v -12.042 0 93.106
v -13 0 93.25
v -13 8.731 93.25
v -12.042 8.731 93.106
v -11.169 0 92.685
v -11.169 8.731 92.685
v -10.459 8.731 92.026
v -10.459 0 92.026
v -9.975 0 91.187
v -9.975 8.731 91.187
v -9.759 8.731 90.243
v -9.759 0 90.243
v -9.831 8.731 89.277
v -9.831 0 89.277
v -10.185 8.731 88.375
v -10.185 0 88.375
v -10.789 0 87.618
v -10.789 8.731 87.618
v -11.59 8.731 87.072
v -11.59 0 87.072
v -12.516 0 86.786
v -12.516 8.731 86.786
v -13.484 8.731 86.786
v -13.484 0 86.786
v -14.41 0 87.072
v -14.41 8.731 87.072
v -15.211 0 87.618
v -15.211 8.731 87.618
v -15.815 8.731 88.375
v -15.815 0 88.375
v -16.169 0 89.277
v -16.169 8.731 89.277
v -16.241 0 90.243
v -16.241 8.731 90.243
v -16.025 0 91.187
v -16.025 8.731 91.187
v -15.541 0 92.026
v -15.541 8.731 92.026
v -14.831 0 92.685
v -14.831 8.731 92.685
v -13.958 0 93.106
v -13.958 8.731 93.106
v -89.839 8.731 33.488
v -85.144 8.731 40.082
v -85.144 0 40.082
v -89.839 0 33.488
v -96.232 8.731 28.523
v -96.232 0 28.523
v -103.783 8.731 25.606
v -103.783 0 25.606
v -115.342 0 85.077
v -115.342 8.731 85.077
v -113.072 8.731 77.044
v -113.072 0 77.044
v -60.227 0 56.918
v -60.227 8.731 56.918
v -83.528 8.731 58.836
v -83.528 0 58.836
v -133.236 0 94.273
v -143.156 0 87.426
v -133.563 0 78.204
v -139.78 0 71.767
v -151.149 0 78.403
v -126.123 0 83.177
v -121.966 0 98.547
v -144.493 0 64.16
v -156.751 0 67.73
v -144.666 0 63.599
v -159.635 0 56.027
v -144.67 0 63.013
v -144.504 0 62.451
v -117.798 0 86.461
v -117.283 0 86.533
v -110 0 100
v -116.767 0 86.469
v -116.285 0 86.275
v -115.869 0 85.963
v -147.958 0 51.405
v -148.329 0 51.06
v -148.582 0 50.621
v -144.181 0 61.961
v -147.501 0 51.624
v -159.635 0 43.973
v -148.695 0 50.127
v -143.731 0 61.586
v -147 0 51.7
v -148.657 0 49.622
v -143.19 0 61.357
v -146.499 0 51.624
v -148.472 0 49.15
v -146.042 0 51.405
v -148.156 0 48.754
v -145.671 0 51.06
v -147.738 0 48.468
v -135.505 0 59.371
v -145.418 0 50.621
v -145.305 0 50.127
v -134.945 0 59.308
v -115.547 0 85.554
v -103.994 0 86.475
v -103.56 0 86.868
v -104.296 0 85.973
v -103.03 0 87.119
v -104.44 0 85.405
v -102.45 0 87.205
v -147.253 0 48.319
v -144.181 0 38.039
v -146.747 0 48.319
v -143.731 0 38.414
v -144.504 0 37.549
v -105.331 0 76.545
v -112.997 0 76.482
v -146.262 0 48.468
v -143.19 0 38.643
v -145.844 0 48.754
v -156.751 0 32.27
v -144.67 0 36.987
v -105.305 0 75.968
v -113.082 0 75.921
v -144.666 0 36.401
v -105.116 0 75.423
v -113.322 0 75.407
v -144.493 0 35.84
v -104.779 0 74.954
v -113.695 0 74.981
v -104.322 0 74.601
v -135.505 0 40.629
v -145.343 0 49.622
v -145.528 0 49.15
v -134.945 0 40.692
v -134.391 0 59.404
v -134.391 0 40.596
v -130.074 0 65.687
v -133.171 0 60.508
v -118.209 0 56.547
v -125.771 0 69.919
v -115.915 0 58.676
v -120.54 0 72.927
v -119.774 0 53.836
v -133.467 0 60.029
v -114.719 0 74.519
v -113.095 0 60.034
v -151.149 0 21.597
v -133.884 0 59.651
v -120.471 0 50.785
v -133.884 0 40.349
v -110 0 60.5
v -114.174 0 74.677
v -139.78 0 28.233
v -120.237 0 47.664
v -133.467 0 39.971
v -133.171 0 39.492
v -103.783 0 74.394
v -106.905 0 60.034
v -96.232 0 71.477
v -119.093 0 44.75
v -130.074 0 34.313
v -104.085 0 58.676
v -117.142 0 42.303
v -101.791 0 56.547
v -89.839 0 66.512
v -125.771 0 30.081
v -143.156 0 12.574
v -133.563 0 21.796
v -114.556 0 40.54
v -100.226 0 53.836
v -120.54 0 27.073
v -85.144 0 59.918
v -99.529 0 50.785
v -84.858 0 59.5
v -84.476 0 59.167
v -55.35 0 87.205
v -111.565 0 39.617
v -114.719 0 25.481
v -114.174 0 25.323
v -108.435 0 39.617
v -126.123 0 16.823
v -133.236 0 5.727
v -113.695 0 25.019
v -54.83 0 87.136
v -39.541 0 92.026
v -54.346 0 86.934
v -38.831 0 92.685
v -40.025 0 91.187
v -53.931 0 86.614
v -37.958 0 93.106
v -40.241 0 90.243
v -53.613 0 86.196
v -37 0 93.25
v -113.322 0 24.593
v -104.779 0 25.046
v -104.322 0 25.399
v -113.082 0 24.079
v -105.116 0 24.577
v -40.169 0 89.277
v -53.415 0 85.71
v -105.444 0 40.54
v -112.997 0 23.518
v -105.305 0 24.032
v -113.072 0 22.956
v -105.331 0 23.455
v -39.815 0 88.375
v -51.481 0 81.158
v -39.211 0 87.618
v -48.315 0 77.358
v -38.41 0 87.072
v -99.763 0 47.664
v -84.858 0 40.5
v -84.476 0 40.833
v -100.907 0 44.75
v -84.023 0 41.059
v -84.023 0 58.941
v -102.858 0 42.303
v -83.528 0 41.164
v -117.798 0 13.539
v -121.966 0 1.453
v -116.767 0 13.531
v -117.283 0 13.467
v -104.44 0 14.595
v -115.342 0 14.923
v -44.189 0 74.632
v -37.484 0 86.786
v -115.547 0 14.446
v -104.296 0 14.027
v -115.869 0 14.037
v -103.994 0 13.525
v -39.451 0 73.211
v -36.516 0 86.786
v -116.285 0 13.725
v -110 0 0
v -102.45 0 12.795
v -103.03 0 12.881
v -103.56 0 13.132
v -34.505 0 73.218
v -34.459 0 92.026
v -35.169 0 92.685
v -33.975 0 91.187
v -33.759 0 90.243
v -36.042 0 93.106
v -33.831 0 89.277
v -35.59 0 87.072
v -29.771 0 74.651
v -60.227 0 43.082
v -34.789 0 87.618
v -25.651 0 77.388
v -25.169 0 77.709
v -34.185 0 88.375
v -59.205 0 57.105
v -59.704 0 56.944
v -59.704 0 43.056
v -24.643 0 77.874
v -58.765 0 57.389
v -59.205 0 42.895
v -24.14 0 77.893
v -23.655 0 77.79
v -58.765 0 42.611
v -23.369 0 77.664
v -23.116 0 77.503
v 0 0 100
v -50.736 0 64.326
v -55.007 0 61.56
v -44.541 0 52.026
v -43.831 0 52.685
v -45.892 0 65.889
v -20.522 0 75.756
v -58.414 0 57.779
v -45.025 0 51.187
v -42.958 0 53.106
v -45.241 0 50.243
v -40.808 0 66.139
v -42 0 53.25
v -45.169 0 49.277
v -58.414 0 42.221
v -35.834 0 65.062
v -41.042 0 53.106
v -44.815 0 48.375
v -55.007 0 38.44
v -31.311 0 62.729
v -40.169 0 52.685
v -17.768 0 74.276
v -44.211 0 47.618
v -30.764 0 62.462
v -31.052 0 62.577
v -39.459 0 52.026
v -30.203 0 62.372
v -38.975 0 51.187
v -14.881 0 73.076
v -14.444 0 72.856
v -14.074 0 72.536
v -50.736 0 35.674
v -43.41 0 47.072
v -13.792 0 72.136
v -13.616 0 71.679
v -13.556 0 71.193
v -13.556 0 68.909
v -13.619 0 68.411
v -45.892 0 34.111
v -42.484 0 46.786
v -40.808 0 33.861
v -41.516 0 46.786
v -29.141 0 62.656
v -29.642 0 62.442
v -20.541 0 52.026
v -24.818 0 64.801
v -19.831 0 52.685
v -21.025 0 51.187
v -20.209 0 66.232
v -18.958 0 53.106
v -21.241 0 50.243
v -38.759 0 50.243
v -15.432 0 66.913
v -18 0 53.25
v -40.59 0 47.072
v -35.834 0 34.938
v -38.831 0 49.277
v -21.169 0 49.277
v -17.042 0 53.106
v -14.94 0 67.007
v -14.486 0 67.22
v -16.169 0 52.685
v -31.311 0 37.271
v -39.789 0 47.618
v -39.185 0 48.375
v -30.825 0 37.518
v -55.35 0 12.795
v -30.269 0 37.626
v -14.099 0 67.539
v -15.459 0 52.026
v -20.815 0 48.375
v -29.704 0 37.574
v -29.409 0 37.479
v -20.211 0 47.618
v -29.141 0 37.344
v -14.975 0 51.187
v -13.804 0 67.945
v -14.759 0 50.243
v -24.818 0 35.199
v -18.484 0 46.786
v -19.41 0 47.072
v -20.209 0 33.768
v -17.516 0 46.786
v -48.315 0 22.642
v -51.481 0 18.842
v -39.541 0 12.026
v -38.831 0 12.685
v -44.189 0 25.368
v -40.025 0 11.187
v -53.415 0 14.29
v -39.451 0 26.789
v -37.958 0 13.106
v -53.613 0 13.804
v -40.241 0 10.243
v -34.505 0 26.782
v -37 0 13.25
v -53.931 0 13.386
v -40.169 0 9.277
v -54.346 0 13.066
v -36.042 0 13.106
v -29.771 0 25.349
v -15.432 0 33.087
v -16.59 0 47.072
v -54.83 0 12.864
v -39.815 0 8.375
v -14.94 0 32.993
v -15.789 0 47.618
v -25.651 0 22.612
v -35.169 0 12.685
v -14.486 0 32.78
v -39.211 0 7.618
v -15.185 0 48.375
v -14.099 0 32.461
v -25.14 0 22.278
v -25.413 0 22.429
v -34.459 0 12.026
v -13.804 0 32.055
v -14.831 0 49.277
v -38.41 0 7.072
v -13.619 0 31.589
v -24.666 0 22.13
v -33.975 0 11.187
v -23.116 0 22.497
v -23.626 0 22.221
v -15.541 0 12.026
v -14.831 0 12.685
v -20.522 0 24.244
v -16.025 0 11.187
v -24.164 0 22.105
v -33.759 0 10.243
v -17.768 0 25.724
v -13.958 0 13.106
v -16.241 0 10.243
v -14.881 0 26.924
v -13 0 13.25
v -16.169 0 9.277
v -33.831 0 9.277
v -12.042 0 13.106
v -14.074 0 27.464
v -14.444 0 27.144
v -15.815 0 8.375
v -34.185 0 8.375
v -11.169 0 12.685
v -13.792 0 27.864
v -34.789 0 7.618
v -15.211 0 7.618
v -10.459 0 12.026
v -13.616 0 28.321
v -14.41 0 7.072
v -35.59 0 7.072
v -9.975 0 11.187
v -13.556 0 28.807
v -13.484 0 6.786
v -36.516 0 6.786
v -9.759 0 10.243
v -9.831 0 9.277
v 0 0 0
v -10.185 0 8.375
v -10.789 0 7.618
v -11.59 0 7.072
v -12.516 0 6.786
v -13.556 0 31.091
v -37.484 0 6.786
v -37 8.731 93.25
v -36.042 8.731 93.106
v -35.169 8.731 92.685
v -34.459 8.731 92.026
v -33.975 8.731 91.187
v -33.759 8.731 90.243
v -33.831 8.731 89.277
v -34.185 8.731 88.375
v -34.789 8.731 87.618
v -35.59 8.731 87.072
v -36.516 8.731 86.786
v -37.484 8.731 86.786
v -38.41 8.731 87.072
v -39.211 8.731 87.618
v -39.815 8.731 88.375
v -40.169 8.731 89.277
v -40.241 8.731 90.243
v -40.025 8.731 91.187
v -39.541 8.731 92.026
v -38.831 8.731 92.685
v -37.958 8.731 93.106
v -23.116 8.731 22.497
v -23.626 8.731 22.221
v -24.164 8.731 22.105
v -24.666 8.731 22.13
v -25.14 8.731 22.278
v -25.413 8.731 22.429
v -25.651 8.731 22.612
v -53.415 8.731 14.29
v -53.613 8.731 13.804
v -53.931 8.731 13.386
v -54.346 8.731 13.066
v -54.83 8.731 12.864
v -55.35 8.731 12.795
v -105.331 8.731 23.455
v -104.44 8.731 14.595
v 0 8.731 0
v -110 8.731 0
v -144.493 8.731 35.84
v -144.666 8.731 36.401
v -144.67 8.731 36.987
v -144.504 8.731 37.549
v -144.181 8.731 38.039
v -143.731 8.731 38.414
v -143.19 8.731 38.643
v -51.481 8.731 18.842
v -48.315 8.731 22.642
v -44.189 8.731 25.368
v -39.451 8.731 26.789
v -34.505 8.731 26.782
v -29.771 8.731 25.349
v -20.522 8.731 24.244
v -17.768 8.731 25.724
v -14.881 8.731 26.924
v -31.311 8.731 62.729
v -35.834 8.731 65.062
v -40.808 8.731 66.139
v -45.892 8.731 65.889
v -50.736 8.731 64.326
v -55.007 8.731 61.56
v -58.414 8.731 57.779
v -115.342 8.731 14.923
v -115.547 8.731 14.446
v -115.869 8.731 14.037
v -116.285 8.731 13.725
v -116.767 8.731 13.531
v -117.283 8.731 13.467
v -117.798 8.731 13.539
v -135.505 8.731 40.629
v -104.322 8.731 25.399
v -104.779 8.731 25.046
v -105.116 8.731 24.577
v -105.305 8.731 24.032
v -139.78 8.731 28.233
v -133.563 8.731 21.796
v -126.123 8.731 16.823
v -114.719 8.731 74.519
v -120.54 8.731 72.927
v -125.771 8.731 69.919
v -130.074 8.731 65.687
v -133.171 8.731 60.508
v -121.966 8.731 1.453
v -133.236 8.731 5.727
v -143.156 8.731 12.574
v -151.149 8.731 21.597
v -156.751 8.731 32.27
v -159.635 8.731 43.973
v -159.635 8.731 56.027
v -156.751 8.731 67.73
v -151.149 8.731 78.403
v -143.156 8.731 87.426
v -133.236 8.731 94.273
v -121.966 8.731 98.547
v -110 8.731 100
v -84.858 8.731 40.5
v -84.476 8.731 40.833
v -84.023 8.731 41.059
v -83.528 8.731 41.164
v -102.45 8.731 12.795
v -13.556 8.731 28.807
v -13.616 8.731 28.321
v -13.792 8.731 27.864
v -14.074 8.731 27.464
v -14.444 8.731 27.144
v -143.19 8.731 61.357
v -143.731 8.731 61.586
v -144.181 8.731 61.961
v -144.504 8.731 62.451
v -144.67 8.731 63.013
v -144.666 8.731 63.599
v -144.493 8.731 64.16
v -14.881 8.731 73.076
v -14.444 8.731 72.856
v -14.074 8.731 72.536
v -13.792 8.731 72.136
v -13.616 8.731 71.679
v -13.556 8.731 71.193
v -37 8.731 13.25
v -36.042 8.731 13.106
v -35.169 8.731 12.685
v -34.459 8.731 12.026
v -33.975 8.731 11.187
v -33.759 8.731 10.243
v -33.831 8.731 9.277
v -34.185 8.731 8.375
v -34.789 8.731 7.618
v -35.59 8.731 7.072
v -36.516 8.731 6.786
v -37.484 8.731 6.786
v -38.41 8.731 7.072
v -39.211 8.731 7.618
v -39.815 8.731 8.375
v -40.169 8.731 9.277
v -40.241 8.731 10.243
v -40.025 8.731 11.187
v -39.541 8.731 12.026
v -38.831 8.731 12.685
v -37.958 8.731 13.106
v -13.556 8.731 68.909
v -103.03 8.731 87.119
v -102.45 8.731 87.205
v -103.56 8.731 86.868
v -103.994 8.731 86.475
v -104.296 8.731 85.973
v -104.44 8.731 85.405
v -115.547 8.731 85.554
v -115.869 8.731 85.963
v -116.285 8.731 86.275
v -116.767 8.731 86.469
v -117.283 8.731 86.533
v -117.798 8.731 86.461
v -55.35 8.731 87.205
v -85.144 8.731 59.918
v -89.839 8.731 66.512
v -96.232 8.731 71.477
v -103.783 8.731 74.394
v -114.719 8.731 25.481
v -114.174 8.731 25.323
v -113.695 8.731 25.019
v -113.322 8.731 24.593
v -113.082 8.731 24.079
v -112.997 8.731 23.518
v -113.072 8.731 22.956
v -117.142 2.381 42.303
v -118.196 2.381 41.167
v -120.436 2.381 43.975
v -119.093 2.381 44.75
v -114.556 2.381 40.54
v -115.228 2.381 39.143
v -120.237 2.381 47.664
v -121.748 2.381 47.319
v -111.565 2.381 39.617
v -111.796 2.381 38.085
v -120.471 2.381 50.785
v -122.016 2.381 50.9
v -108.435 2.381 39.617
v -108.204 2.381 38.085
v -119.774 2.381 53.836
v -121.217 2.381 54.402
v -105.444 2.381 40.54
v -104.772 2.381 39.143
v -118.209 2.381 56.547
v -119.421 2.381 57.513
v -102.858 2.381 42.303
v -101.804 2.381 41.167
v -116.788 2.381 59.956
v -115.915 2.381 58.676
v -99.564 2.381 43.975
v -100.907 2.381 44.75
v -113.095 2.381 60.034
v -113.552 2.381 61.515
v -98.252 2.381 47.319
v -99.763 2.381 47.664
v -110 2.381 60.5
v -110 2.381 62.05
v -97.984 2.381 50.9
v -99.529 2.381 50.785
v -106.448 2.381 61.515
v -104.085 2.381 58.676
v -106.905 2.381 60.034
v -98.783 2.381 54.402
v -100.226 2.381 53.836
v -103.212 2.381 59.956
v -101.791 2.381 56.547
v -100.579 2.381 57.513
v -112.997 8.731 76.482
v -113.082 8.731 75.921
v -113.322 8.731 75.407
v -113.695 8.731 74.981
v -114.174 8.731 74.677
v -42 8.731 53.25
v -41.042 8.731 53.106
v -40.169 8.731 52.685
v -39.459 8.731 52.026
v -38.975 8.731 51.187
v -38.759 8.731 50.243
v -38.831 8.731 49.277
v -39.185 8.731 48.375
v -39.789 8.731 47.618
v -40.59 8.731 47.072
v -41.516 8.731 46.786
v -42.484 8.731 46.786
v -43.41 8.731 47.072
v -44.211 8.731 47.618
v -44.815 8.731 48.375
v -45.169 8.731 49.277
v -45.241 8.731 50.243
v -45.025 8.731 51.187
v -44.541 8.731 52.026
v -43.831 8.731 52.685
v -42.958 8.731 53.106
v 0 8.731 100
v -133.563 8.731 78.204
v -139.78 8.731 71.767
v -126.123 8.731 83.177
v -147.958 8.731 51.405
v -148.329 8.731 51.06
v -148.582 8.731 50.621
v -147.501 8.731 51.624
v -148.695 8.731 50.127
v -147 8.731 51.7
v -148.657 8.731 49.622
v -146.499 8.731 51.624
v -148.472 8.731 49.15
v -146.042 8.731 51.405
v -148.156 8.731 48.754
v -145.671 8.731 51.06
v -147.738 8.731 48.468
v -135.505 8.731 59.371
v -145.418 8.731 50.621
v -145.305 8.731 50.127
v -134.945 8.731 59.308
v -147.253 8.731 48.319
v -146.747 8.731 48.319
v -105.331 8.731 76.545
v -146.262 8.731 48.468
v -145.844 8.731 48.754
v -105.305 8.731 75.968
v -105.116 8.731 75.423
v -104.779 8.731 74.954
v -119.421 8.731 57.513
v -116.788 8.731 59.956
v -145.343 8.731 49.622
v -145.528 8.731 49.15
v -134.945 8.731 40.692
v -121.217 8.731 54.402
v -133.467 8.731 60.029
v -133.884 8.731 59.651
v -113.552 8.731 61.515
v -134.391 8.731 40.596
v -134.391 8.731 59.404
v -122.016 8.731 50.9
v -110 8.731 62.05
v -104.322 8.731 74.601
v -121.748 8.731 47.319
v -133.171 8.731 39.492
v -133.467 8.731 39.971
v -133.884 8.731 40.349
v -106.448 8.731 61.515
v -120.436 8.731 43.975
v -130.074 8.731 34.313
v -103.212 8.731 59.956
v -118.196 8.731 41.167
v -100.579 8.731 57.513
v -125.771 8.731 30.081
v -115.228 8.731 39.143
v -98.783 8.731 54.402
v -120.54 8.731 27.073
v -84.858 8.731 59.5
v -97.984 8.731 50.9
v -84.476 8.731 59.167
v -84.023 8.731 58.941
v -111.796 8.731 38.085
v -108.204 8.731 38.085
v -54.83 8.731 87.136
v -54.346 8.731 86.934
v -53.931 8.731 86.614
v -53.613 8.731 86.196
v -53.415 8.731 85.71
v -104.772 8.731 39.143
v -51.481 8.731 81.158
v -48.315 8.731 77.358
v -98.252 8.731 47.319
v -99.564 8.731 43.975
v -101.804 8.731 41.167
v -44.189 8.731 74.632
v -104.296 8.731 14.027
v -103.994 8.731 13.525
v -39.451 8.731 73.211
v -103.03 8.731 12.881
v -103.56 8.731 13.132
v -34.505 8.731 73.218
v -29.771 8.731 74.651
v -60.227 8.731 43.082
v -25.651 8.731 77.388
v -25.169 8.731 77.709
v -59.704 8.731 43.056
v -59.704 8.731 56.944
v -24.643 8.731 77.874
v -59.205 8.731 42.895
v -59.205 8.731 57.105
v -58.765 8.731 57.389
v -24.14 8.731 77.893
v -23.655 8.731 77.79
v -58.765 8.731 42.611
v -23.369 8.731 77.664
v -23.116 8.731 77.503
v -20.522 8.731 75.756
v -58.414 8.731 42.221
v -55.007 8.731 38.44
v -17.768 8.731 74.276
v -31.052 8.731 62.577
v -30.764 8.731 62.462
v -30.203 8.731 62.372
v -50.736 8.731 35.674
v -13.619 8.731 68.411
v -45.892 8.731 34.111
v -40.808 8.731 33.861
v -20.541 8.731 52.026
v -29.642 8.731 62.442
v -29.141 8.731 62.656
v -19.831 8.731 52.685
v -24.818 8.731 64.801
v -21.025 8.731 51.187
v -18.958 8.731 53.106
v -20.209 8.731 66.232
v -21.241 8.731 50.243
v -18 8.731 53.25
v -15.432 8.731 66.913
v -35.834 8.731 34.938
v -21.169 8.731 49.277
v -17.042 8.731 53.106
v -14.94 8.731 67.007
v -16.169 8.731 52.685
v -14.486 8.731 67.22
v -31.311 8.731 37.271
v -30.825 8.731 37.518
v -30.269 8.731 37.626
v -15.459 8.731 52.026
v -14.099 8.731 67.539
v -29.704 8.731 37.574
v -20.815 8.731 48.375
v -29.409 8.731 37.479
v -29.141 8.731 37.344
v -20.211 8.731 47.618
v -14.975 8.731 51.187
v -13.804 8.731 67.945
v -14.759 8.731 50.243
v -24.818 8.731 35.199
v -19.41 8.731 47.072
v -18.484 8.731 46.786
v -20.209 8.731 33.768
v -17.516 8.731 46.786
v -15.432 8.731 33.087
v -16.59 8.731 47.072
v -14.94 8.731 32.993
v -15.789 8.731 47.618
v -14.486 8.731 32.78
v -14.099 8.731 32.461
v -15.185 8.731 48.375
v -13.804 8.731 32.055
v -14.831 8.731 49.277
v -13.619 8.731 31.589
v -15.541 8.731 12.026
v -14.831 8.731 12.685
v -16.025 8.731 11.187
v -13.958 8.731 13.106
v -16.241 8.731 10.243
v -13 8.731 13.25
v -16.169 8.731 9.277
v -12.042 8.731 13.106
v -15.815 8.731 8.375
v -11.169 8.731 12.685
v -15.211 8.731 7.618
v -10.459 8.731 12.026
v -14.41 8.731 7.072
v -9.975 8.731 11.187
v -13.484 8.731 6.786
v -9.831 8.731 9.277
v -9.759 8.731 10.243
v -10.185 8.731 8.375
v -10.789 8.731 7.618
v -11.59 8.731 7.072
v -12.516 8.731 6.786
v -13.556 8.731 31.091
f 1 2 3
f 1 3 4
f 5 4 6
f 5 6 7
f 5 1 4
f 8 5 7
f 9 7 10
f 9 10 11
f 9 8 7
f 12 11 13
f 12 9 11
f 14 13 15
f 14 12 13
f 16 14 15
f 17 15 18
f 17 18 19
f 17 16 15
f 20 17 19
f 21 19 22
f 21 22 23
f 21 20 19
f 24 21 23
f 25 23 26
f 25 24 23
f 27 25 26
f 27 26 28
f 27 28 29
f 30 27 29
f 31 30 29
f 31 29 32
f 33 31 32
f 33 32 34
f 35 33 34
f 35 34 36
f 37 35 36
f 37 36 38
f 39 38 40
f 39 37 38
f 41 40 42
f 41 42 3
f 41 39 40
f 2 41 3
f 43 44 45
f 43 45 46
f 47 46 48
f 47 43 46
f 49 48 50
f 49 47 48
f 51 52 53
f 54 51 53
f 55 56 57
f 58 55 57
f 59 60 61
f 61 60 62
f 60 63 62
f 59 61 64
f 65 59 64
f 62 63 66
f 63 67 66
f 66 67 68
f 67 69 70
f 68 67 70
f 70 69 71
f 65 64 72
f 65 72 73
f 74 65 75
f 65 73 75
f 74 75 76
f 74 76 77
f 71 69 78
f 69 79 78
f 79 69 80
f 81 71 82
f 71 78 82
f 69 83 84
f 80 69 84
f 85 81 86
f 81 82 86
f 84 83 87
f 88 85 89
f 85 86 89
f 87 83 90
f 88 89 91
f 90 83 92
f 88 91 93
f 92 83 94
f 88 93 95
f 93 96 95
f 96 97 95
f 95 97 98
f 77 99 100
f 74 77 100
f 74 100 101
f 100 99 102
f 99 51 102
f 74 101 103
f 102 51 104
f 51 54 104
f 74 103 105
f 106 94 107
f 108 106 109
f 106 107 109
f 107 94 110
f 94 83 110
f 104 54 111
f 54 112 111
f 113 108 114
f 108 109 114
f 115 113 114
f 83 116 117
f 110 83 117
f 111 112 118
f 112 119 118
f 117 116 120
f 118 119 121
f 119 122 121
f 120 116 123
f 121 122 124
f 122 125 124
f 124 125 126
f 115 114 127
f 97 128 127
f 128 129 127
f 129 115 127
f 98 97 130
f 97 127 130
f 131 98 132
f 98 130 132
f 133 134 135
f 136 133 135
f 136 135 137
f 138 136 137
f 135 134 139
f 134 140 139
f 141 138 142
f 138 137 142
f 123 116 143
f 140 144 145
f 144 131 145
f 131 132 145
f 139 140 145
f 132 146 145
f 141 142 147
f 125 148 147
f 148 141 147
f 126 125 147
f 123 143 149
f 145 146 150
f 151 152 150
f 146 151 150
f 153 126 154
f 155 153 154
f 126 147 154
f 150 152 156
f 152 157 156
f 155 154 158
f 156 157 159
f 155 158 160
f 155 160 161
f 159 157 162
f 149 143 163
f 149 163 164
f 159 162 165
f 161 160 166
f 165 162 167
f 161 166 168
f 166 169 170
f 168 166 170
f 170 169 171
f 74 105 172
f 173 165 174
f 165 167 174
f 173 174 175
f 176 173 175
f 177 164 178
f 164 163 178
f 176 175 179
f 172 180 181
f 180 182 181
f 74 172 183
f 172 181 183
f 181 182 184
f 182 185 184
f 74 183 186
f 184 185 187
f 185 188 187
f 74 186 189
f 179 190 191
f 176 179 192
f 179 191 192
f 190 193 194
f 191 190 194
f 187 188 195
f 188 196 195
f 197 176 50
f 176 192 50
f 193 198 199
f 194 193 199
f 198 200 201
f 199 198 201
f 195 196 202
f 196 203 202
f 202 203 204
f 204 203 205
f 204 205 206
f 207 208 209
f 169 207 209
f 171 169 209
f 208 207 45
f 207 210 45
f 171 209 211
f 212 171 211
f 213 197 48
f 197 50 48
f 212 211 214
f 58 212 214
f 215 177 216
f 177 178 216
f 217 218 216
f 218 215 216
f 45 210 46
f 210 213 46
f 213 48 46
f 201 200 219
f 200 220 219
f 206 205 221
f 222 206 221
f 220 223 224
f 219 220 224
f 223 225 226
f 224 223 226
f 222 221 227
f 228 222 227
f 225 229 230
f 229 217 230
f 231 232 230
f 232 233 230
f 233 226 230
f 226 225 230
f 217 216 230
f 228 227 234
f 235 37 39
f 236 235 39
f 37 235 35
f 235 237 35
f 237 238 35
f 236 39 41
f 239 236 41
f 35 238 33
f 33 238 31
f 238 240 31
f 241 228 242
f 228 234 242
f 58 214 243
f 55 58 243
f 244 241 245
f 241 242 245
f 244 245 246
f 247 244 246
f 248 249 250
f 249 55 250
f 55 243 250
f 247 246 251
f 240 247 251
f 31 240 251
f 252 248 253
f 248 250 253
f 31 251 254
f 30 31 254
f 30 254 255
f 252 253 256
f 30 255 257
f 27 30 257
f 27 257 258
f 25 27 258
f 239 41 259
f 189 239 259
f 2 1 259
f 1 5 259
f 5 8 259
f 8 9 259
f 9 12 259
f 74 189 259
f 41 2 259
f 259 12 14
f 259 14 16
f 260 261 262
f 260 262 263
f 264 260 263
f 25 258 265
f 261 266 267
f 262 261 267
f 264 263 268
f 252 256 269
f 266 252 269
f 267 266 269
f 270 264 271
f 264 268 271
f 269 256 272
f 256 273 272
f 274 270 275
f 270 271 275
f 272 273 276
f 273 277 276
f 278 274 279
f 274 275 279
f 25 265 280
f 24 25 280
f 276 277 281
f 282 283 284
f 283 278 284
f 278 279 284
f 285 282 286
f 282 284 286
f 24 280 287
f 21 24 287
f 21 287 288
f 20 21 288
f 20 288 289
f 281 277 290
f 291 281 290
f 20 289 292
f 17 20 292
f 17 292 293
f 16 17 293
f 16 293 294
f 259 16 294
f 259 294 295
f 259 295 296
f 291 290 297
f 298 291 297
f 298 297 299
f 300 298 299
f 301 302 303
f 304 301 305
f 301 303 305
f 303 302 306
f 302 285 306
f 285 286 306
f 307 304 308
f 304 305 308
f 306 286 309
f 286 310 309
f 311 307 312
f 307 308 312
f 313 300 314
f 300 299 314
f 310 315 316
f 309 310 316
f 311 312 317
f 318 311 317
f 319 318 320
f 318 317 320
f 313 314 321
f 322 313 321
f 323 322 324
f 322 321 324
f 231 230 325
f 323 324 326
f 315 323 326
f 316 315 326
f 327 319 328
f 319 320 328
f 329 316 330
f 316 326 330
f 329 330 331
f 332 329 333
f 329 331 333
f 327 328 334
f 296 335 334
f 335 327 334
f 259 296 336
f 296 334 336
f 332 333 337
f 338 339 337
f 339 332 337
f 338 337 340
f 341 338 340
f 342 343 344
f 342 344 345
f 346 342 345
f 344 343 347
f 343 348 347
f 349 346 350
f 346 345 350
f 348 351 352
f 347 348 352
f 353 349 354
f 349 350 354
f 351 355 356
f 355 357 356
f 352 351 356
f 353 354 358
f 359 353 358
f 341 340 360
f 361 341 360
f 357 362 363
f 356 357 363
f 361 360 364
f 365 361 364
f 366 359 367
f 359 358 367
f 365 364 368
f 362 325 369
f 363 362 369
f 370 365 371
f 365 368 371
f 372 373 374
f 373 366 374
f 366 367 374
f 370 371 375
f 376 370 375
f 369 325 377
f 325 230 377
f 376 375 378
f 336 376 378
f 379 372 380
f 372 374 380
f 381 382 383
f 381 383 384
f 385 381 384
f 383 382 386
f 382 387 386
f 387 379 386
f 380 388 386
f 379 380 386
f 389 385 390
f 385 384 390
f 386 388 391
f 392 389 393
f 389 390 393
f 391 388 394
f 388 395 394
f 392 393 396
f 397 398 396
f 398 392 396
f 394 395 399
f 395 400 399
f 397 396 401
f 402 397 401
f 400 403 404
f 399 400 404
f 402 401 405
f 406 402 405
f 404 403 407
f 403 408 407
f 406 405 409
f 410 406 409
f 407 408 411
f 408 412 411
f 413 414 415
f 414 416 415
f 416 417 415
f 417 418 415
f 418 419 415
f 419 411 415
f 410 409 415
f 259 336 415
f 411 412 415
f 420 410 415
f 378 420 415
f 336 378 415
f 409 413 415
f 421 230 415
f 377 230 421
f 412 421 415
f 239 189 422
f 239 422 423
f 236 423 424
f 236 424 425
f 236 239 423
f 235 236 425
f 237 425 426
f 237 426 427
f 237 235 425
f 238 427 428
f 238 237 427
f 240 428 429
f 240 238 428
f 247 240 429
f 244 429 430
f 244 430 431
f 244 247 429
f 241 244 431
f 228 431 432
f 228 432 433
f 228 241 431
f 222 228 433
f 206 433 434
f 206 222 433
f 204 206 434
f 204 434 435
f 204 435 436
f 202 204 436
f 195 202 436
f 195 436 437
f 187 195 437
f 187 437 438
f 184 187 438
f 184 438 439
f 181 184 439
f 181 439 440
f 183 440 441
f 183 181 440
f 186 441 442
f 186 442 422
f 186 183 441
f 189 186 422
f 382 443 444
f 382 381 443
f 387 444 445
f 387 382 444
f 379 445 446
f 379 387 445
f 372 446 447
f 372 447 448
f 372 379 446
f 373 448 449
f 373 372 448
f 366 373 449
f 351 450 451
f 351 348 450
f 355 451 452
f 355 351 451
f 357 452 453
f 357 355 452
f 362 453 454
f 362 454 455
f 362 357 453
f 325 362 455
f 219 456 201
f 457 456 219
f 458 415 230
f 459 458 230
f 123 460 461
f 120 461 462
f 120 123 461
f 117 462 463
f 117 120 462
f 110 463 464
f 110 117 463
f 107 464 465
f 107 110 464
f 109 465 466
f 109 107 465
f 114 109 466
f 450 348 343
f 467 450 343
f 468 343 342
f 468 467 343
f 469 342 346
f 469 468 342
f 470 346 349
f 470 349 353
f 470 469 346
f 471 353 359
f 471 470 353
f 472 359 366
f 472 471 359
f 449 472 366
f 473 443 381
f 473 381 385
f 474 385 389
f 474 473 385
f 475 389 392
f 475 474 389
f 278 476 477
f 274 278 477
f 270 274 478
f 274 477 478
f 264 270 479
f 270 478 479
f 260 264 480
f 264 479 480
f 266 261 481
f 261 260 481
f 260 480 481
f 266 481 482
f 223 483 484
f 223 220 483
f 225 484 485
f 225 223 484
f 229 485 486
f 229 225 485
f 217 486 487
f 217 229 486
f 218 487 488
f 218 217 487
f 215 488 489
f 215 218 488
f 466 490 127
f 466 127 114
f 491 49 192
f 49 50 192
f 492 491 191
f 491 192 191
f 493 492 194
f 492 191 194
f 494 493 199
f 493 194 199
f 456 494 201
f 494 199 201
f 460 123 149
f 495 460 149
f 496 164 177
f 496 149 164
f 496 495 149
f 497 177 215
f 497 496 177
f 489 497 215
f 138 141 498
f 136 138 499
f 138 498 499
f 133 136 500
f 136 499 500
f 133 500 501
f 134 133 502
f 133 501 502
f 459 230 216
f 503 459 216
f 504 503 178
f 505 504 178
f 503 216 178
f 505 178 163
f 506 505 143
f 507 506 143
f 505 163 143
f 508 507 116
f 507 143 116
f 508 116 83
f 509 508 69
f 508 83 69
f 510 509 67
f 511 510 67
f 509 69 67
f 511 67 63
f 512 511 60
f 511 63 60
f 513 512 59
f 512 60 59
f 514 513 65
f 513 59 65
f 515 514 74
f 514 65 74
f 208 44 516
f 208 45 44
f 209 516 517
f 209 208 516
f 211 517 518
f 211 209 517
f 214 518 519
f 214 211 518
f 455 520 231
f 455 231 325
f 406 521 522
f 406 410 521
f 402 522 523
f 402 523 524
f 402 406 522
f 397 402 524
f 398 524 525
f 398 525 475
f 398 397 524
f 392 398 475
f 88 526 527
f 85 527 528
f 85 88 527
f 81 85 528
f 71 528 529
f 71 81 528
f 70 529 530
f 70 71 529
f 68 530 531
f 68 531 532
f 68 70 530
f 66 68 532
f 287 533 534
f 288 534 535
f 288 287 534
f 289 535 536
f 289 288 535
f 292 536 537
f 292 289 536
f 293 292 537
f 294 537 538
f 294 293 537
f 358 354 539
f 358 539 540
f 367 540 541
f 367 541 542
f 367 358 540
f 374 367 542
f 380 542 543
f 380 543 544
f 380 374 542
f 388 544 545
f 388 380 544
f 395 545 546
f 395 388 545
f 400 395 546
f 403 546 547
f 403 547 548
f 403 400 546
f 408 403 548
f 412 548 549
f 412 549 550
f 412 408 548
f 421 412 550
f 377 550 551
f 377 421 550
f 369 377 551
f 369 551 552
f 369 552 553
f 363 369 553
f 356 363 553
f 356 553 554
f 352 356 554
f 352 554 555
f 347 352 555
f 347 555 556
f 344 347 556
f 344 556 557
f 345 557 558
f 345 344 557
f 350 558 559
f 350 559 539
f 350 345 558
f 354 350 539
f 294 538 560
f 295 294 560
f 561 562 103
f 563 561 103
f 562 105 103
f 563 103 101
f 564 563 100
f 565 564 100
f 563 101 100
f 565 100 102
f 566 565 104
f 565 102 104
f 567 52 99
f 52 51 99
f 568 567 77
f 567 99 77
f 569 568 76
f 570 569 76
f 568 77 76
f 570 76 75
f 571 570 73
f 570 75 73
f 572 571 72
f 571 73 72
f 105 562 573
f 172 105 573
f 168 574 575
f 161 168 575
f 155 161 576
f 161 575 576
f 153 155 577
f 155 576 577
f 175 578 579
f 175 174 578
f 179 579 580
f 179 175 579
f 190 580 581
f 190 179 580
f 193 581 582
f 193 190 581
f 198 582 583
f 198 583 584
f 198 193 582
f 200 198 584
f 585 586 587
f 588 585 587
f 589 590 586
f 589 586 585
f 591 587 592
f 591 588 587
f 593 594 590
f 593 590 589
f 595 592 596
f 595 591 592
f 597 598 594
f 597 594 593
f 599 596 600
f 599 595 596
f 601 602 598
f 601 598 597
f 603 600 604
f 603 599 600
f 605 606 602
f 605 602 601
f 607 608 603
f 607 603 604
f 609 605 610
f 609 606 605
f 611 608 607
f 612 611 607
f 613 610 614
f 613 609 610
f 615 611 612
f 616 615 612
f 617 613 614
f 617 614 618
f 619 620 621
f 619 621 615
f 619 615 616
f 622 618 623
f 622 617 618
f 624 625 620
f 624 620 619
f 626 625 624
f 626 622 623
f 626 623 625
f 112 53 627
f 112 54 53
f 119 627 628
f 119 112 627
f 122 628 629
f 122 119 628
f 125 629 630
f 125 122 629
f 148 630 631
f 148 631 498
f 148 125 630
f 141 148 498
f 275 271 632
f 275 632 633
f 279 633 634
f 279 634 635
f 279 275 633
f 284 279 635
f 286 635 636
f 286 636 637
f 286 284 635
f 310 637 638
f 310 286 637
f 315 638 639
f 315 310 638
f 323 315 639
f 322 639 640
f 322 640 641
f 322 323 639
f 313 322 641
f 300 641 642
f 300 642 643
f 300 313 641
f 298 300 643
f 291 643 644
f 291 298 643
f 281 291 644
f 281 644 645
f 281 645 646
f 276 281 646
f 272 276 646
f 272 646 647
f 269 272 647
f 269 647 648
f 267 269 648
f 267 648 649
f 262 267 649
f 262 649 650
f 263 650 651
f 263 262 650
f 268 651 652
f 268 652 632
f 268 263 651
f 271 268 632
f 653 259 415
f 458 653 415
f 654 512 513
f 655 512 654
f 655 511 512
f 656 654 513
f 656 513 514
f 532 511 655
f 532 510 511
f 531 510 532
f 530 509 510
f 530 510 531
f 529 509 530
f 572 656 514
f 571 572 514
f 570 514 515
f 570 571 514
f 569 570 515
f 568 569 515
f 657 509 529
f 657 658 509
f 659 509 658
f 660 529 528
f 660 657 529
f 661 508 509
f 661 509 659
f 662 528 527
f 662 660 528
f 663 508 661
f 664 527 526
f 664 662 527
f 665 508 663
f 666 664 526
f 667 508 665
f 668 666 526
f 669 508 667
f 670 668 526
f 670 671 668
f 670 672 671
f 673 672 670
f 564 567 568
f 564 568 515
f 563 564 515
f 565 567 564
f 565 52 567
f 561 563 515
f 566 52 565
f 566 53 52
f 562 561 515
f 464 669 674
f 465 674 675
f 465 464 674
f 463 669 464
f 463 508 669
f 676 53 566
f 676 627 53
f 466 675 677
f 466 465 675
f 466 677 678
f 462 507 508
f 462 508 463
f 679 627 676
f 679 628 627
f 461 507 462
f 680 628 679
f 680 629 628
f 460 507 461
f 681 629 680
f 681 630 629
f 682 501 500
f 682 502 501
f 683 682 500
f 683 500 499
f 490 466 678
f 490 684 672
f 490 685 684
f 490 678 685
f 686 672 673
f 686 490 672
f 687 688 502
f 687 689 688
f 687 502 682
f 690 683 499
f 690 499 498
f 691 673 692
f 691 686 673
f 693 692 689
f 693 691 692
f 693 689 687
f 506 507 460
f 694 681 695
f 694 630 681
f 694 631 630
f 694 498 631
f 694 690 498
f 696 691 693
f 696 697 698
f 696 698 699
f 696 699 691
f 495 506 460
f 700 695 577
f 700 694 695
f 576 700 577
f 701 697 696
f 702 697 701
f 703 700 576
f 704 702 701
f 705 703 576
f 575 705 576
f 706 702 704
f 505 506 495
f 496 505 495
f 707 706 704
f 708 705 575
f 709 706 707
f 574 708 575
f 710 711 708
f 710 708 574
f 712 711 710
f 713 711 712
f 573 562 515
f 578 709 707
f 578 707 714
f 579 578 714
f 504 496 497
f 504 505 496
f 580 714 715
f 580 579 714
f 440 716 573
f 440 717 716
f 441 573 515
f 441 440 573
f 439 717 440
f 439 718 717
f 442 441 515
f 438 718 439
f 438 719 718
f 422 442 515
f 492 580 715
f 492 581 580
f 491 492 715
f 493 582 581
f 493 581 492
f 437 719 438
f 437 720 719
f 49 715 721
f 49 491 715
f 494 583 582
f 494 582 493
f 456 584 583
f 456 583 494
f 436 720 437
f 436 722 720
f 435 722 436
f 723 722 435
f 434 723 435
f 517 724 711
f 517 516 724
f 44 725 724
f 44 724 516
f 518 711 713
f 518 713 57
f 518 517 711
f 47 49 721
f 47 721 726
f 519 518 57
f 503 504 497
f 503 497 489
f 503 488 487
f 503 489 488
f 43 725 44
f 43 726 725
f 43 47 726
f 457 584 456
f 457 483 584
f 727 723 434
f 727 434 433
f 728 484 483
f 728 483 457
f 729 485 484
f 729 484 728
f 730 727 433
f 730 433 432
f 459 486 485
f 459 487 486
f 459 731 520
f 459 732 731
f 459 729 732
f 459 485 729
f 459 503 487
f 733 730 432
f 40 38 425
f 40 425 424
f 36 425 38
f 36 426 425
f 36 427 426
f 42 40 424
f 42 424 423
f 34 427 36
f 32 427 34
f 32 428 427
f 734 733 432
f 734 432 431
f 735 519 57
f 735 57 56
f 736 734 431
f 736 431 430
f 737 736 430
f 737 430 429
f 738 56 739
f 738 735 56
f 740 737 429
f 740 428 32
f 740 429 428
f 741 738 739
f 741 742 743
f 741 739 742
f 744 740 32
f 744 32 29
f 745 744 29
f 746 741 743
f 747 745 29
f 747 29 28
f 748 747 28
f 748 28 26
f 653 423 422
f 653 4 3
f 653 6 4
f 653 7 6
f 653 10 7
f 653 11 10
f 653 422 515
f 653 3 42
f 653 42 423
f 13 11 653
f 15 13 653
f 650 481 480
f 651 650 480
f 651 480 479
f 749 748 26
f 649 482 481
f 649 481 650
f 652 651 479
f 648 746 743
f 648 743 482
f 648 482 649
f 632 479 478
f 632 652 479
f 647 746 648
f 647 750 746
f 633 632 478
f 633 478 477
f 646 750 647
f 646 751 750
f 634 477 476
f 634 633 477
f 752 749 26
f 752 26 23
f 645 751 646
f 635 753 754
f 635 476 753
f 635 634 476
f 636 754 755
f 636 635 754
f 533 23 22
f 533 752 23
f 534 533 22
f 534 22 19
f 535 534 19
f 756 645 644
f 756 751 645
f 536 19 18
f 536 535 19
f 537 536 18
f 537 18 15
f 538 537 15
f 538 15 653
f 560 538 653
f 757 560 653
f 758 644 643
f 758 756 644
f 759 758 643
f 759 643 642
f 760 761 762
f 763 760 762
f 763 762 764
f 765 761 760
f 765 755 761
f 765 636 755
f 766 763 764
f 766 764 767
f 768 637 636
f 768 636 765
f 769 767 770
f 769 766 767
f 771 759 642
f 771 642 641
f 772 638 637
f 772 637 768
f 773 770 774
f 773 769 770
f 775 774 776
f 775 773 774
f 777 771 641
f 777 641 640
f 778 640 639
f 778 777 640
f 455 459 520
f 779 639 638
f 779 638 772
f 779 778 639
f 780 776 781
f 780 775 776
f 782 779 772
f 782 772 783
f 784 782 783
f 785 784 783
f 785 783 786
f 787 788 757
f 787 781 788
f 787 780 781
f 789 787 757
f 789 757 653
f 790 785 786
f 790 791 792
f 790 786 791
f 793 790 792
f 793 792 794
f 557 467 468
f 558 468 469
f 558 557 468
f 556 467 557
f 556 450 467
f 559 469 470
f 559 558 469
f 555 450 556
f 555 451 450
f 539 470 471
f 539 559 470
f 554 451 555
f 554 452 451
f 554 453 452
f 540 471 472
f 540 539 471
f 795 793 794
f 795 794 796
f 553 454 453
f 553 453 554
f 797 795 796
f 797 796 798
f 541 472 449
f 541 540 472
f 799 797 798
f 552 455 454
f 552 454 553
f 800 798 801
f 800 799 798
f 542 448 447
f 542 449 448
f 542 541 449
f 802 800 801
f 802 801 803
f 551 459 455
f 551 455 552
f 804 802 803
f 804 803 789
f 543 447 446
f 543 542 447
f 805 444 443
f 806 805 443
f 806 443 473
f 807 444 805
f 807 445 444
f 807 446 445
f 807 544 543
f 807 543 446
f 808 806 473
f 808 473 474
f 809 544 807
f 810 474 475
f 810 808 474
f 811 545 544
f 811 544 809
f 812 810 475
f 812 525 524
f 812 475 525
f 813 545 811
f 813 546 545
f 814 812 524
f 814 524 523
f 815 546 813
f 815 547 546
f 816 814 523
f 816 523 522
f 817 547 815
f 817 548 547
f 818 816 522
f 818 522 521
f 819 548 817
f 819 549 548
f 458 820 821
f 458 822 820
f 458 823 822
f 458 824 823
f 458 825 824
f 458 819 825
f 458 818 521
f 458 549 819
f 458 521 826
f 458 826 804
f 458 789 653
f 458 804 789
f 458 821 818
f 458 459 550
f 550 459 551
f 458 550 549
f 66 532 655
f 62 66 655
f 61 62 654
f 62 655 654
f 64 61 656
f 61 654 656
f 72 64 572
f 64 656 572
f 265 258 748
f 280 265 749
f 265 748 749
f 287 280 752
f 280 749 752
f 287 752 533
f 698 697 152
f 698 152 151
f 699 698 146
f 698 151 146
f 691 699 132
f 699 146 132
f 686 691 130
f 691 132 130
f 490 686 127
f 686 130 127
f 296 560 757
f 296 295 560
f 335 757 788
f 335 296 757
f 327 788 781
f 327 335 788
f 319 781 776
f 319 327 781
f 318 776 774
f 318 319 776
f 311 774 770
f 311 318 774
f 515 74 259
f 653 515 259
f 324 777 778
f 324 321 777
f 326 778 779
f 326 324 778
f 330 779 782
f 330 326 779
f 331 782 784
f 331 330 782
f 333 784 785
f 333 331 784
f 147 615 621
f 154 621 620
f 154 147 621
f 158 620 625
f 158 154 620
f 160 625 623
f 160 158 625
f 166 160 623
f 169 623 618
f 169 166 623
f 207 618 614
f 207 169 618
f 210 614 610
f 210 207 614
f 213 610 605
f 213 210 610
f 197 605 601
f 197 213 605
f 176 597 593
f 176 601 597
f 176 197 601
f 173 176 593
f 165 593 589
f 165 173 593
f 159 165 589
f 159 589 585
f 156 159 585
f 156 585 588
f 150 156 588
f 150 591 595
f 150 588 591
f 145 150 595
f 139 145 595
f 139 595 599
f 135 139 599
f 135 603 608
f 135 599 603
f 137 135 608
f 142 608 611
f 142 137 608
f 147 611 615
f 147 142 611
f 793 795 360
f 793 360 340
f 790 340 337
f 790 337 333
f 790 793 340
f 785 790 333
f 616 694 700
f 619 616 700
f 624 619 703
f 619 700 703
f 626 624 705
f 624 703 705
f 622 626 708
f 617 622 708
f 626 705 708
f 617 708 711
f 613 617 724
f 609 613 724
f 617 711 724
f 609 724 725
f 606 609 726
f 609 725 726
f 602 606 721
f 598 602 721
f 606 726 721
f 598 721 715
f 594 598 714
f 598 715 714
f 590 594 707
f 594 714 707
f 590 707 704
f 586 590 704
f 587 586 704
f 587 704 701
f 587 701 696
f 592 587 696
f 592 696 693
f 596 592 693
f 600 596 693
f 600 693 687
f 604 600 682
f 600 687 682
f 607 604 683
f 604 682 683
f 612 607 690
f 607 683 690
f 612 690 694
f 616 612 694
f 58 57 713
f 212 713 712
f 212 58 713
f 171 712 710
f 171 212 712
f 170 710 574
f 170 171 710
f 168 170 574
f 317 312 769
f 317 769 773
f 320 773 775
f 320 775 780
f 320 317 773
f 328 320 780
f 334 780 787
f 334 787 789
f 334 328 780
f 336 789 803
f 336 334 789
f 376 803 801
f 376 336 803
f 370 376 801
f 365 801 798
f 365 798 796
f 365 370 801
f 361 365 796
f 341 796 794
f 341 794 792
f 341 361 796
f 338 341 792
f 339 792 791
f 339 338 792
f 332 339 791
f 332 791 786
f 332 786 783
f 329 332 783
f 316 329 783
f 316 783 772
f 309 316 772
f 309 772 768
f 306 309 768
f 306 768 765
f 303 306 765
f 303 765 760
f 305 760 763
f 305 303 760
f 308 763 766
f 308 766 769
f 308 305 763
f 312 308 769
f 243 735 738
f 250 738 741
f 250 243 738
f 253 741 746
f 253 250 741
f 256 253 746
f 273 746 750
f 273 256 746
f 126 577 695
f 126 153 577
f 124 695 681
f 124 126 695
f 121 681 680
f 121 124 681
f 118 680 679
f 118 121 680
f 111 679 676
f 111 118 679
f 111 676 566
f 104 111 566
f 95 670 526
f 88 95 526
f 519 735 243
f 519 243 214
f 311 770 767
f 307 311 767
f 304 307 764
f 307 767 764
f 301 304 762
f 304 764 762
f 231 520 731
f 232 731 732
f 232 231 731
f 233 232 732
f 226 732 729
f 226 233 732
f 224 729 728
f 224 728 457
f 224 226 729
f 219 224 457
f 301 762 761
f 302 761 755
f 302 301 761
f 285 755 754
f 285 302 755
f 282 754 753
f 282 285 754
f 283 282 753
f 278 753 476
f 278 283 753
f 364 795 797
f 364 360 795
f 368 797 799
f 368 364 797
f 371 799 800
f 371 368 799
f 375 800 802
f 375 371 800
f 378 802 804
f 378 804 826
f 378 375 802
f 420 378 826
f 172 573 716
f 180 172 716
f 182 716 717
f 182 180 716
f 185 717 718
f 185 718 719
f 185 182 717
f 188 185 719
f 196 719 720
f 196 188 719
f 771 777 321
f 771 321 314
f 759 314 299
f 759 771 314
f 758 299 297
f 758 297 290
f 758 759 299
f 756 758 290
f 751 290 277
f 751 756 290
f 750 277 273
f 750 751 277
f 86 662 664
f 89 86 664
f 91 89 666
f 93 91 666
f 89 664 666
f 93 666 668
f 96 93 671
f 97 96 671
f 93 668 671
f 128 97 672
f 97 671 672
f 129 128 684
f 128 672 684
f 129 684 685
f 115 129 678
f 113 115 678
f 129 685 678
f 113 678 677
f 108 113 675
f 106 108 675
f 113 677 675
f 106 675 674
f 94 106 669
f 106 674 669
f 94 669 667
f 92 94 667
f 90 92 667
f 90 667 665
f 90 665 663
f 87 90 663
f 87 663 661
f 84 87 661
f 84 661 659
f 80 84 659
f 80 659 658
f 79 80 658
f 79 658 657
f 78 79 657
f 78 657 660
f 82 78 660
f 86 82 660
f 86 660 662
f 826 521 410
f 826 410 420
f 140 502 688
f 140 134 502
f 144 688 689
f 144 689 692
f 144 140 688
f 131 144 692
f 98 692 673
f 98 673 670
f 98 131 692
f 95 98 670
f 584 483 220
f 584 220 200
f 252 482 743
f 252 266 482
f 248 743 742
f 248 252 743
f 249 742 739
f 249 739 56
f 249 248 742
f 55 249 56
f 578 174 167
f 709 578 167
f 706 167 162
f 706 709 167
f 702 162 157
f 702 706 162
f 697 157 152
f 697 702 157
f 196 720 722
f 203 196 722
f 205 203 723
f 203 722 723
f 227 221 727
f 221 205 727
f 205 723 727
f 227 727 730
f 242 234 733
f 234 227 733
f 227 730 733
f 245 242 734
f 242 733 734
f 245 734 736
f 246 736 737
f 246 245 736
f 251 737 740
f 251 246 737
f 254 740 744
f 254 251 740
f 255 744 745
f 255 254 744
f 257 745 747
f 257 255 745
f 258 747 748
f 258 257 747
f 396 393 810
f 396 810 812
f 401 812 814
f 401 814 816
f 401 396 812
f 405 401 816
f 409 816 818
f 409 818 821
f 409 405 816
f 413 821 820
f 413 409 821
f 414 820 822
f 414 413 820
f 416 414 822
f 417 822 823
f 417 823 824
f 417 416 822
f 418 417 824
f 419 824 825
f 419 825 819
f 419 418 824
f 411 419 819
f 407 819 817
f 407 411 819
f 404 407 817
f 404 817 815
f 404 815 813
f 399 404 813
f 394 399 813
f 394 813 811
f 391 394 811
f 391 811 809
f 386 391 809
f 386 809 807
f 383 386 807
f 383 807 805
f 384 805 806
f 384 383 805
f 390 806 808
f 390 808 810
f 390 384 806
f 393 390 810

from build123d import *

# Parameters (mm, degrees)
SKETCH1_R           = 3.25
SKETCH1_R_2         = 10.5
BOSS_EXTRUDE1_DEPTH = 8.73125
SKETCH2_R           = 12.05
CUT_EXTRUDE1_DEPTH  = 6.35
SKETCH6_R           = 1.7
CUT_EXTRUDE4_DEPTH  = 189.881536225
FILLET1_R           = 2


with BuildPart() as part:
    # Sketch1 → Boss-Extrude1 (new body)
    with BuildSketch(Plane(origin=(0, 0, 0), x_dir=(1, 0, 0), z_dir=(0, 1, 0))):
        with BuildLine():
            Line((-110, -100), (0, -100))
            Line((0, -100), (0, 0))
            Line((0, 0), (-110, 0))
            ThreePointArc((-110, 0), (-160, -50), (-110, -100))
        make_face()
        with Locations(Location((-13, -10, 0), (0, 0, 270))):
            Circle(SKETCH1_R, mode=Mode.SUBTRACT)
        with Locations(Location((-37, -10, 0), (0, 0, 270))):
            Circle(SKETCH1_R, mode=Mode.SUBTRACT)
        with Locations(Location((-18, -50, 0), (0, 0, 270))):
            Circle(SKETCH1_R, mode=Mode.SUBTRACT)
        with Locations(Location((-13, -90, 0), (0, 0, 270))):
            Circle(SKETCH1_R, mode=Mode.SUBTRACT)
        with Locations(Location((-37, -90, 0), (0, 0, 270))):
            Circle(SKETCH1_R, mode=Mode.SUBTRACT)
        with Locations(Location((-42, -50, 0), (0, 0, 270))):
            Circle(SKETCH1_R, mode=Mode.SUBTRACT)
        with Locations(Location((-110, -50, 0), (0, 0, 270))):
            Circle(SKETCH1_R_2, mode=Mode.SUBTRACT)
    extrude(amount=BOSS_EXTRUDE1_DEPTH)

    # Sketch2 → Cut-Extrude1 (cut)
    with BuildSketch(Plane(origin=(0, 8.73125, 0), x_dir=(1, 0, 0), z_dir=(0, 1, 0))):
        with Locations(Location((-110, -50, 0), (0, 0, 270))):
            Circle(SKETCH2_R)
    extrude(amount=-CUT_EXTRUDE1_DEPTH, mode=Mode.SUBTRACT)

    # Sketch6 → Cut-Extrude4 (cut, through all)
    with BuildSketch(Plane(origin=(0, 8.73125, 0), x_dir=(1, 0, 0), z_dir=(0, 1, 0))):
        with Locations(Location((-147, -50, 0), (0, 0, 270))):
            Circle(SKETCH6_R)
        with BuildLine():
            Line((-133.793921789, -41.071004616), (-145.477766874, -38.051775556))
            ThreePointArc((-145.477766874, -38.051775556), (-133.72851482, -21.93564785), (-115.86984126, -13.056330604))
            Line((-115.86984126, -13.056330604), (-112.417796121, -25.271259557))
            ThreePointArc((-112.417796121, -25.271259557), (-125.525564083, -29.897413384), (-133.793921789, -41.071004616))
        make_face()
        with BuildLine():
            Line((-105.513705843, -25.271259557), (-104.258758681, -12.795366162))
            Line((-104.258758681, -12.795366162), (-53.734606151, -12.795366162))
            ThreePointArc((-53.734606151, -12.795366162), (-41.801024618, -26.273023002), (-24.46272378, -21.431439979))
            ThreePointArc((-24.46272378, -21.431439979), (-19.304766449, -24.941567185), (-13.556215286, -27.366371581))
            Line((-13.556215286, -27.366371581), (-13.556215286, -33.028900538))
            ThreePointArc((-13.556215286, -33.028900538), (-22.279595055, -34.31177696), (-30.264301501, -38.051775556))
            ThreePointArc((-30.264301501, -38.051775556), (-45.81064331, -34.0967888), (-59.032653211, -43.180241783))
            Line((-59.032653211, -43.180241783), (-84.662721734, -41.071004616))
            ThreePointArc((-84.662721734, -41.071004616), (-93.117084888, -30.569825722), (-105.513705843, -25.271259557))
        make_face()
        with BuildLine():
            Line((-115.86984126, -86.943669396), (-112.417796121, -74.728740443))
            ThreePointArc((-112.417796121, -74.728740443), (-125.525564083, -70.102586616), (-133.793921789, -58.928995384))
            Line((-133.793921789, -58.928995384), (-145.477766874, -61.948224444))
            ThreePointArc((-145.477766874, -61.948224444), (-133.72851482, -78.06435215), (-115.86984126, -86.943669396))
        make_face()
        with BuildLine():
            Line((-104.258758681, -87.204633838), (-53.734606151, -87.204633838))
            ThreePointArc((-53.734606151, -87.204633838), (-41.801024618, -73.726976998), (-24.46272378, -78.568560021))
            ThreePointArc((-24.46272378, -78.568560021), (-19.304766449, -75.058432815), (-13.556215286, -72.633628419))
            Line((-13.556215286, -72.633628419), (-13.556215286, -66.971099462))
            ThreePointArc((-13.556215286, -66.971099462), (-22.279595055, -65.68822304), (-30.264301501, -61.948224444))
            ThreePointArc((-30.264301501, -61.948224444), (-45.81064331, -65.9032112), (-59.032653211, -56.819758217))
            Line((-59.032653211, -56.819758217), (-84.662721734, -58.928995384))
            ThreePointArc((-84.662721734, -58.928995384), (-93.117084888, -69.430174278), (-105.513705843, -74.728740443))
            Line((-105.513705843, -74.728740443), (-104.258758681, -87.204633838))
        make_face()
    extrude(amount=-CUT_EXTRUDE4_DEPTH, mode=Mode.SUBTRACT)

    # Fillet1
    fillet1_edges = [part.edges().sort_by_distance(p)[0] for p in [
        (-13.556215286, 4.365625, 33.028900538),
        (-30.264301501, 4.365625, 38.051775556),
        (-59.032653211, 4.365625, 43.180241783),
        (-112.417796121, 4.365625, 25.271259557),
        (-133.793921789, 4.365625, 41.071004616),
        (-145.477766874, 4.365625, 38.051775556),
        (-115.86984126, 4.365625, 13.056330604),
        (-24.46272378, 4.365625, 78.568560021),
        (-53.734606151, 4.365625, 87.204633838),
        (-104.258758681, 4.365625, 87.204633838),
        (-105.513705843, 4.365625, 74.728740443),
        (-84.662721734, 4.365625, 58.928995384),
        (-59.032653211, 4.365625, 56.819758217),
        (-30.264301501, 4.365625, 61.948224444),
        (-13.556215286, 4.365625, 66.971099462),
        (-13.556215286, 4.365625, 72.633628419),
        (-115.86984126, 4.365625, 86.943669396),
        (-145.477766874, 4.365625, 61.948224444),
        (-133.793921789, 4.365625, 58.928995384),
        (-112.417796121, 4.365625, 74.728740443),
        (-84.662721734, 4.365625, 41.071004616),
        (-105.513705843, 4.365625, 25.271259557),
        (-104.258758681, 4.365625, 12.795366162),
        (-53.734606151, 4.365625, 12.795366162),
        (-24.46272378, 4.365625, 21.431439979),
        (-13.556215286, 4.365625, 27.366371581),
    ]]
    fillet(fillet1_edges, radius=FILLET1_R)


solid = part.part
